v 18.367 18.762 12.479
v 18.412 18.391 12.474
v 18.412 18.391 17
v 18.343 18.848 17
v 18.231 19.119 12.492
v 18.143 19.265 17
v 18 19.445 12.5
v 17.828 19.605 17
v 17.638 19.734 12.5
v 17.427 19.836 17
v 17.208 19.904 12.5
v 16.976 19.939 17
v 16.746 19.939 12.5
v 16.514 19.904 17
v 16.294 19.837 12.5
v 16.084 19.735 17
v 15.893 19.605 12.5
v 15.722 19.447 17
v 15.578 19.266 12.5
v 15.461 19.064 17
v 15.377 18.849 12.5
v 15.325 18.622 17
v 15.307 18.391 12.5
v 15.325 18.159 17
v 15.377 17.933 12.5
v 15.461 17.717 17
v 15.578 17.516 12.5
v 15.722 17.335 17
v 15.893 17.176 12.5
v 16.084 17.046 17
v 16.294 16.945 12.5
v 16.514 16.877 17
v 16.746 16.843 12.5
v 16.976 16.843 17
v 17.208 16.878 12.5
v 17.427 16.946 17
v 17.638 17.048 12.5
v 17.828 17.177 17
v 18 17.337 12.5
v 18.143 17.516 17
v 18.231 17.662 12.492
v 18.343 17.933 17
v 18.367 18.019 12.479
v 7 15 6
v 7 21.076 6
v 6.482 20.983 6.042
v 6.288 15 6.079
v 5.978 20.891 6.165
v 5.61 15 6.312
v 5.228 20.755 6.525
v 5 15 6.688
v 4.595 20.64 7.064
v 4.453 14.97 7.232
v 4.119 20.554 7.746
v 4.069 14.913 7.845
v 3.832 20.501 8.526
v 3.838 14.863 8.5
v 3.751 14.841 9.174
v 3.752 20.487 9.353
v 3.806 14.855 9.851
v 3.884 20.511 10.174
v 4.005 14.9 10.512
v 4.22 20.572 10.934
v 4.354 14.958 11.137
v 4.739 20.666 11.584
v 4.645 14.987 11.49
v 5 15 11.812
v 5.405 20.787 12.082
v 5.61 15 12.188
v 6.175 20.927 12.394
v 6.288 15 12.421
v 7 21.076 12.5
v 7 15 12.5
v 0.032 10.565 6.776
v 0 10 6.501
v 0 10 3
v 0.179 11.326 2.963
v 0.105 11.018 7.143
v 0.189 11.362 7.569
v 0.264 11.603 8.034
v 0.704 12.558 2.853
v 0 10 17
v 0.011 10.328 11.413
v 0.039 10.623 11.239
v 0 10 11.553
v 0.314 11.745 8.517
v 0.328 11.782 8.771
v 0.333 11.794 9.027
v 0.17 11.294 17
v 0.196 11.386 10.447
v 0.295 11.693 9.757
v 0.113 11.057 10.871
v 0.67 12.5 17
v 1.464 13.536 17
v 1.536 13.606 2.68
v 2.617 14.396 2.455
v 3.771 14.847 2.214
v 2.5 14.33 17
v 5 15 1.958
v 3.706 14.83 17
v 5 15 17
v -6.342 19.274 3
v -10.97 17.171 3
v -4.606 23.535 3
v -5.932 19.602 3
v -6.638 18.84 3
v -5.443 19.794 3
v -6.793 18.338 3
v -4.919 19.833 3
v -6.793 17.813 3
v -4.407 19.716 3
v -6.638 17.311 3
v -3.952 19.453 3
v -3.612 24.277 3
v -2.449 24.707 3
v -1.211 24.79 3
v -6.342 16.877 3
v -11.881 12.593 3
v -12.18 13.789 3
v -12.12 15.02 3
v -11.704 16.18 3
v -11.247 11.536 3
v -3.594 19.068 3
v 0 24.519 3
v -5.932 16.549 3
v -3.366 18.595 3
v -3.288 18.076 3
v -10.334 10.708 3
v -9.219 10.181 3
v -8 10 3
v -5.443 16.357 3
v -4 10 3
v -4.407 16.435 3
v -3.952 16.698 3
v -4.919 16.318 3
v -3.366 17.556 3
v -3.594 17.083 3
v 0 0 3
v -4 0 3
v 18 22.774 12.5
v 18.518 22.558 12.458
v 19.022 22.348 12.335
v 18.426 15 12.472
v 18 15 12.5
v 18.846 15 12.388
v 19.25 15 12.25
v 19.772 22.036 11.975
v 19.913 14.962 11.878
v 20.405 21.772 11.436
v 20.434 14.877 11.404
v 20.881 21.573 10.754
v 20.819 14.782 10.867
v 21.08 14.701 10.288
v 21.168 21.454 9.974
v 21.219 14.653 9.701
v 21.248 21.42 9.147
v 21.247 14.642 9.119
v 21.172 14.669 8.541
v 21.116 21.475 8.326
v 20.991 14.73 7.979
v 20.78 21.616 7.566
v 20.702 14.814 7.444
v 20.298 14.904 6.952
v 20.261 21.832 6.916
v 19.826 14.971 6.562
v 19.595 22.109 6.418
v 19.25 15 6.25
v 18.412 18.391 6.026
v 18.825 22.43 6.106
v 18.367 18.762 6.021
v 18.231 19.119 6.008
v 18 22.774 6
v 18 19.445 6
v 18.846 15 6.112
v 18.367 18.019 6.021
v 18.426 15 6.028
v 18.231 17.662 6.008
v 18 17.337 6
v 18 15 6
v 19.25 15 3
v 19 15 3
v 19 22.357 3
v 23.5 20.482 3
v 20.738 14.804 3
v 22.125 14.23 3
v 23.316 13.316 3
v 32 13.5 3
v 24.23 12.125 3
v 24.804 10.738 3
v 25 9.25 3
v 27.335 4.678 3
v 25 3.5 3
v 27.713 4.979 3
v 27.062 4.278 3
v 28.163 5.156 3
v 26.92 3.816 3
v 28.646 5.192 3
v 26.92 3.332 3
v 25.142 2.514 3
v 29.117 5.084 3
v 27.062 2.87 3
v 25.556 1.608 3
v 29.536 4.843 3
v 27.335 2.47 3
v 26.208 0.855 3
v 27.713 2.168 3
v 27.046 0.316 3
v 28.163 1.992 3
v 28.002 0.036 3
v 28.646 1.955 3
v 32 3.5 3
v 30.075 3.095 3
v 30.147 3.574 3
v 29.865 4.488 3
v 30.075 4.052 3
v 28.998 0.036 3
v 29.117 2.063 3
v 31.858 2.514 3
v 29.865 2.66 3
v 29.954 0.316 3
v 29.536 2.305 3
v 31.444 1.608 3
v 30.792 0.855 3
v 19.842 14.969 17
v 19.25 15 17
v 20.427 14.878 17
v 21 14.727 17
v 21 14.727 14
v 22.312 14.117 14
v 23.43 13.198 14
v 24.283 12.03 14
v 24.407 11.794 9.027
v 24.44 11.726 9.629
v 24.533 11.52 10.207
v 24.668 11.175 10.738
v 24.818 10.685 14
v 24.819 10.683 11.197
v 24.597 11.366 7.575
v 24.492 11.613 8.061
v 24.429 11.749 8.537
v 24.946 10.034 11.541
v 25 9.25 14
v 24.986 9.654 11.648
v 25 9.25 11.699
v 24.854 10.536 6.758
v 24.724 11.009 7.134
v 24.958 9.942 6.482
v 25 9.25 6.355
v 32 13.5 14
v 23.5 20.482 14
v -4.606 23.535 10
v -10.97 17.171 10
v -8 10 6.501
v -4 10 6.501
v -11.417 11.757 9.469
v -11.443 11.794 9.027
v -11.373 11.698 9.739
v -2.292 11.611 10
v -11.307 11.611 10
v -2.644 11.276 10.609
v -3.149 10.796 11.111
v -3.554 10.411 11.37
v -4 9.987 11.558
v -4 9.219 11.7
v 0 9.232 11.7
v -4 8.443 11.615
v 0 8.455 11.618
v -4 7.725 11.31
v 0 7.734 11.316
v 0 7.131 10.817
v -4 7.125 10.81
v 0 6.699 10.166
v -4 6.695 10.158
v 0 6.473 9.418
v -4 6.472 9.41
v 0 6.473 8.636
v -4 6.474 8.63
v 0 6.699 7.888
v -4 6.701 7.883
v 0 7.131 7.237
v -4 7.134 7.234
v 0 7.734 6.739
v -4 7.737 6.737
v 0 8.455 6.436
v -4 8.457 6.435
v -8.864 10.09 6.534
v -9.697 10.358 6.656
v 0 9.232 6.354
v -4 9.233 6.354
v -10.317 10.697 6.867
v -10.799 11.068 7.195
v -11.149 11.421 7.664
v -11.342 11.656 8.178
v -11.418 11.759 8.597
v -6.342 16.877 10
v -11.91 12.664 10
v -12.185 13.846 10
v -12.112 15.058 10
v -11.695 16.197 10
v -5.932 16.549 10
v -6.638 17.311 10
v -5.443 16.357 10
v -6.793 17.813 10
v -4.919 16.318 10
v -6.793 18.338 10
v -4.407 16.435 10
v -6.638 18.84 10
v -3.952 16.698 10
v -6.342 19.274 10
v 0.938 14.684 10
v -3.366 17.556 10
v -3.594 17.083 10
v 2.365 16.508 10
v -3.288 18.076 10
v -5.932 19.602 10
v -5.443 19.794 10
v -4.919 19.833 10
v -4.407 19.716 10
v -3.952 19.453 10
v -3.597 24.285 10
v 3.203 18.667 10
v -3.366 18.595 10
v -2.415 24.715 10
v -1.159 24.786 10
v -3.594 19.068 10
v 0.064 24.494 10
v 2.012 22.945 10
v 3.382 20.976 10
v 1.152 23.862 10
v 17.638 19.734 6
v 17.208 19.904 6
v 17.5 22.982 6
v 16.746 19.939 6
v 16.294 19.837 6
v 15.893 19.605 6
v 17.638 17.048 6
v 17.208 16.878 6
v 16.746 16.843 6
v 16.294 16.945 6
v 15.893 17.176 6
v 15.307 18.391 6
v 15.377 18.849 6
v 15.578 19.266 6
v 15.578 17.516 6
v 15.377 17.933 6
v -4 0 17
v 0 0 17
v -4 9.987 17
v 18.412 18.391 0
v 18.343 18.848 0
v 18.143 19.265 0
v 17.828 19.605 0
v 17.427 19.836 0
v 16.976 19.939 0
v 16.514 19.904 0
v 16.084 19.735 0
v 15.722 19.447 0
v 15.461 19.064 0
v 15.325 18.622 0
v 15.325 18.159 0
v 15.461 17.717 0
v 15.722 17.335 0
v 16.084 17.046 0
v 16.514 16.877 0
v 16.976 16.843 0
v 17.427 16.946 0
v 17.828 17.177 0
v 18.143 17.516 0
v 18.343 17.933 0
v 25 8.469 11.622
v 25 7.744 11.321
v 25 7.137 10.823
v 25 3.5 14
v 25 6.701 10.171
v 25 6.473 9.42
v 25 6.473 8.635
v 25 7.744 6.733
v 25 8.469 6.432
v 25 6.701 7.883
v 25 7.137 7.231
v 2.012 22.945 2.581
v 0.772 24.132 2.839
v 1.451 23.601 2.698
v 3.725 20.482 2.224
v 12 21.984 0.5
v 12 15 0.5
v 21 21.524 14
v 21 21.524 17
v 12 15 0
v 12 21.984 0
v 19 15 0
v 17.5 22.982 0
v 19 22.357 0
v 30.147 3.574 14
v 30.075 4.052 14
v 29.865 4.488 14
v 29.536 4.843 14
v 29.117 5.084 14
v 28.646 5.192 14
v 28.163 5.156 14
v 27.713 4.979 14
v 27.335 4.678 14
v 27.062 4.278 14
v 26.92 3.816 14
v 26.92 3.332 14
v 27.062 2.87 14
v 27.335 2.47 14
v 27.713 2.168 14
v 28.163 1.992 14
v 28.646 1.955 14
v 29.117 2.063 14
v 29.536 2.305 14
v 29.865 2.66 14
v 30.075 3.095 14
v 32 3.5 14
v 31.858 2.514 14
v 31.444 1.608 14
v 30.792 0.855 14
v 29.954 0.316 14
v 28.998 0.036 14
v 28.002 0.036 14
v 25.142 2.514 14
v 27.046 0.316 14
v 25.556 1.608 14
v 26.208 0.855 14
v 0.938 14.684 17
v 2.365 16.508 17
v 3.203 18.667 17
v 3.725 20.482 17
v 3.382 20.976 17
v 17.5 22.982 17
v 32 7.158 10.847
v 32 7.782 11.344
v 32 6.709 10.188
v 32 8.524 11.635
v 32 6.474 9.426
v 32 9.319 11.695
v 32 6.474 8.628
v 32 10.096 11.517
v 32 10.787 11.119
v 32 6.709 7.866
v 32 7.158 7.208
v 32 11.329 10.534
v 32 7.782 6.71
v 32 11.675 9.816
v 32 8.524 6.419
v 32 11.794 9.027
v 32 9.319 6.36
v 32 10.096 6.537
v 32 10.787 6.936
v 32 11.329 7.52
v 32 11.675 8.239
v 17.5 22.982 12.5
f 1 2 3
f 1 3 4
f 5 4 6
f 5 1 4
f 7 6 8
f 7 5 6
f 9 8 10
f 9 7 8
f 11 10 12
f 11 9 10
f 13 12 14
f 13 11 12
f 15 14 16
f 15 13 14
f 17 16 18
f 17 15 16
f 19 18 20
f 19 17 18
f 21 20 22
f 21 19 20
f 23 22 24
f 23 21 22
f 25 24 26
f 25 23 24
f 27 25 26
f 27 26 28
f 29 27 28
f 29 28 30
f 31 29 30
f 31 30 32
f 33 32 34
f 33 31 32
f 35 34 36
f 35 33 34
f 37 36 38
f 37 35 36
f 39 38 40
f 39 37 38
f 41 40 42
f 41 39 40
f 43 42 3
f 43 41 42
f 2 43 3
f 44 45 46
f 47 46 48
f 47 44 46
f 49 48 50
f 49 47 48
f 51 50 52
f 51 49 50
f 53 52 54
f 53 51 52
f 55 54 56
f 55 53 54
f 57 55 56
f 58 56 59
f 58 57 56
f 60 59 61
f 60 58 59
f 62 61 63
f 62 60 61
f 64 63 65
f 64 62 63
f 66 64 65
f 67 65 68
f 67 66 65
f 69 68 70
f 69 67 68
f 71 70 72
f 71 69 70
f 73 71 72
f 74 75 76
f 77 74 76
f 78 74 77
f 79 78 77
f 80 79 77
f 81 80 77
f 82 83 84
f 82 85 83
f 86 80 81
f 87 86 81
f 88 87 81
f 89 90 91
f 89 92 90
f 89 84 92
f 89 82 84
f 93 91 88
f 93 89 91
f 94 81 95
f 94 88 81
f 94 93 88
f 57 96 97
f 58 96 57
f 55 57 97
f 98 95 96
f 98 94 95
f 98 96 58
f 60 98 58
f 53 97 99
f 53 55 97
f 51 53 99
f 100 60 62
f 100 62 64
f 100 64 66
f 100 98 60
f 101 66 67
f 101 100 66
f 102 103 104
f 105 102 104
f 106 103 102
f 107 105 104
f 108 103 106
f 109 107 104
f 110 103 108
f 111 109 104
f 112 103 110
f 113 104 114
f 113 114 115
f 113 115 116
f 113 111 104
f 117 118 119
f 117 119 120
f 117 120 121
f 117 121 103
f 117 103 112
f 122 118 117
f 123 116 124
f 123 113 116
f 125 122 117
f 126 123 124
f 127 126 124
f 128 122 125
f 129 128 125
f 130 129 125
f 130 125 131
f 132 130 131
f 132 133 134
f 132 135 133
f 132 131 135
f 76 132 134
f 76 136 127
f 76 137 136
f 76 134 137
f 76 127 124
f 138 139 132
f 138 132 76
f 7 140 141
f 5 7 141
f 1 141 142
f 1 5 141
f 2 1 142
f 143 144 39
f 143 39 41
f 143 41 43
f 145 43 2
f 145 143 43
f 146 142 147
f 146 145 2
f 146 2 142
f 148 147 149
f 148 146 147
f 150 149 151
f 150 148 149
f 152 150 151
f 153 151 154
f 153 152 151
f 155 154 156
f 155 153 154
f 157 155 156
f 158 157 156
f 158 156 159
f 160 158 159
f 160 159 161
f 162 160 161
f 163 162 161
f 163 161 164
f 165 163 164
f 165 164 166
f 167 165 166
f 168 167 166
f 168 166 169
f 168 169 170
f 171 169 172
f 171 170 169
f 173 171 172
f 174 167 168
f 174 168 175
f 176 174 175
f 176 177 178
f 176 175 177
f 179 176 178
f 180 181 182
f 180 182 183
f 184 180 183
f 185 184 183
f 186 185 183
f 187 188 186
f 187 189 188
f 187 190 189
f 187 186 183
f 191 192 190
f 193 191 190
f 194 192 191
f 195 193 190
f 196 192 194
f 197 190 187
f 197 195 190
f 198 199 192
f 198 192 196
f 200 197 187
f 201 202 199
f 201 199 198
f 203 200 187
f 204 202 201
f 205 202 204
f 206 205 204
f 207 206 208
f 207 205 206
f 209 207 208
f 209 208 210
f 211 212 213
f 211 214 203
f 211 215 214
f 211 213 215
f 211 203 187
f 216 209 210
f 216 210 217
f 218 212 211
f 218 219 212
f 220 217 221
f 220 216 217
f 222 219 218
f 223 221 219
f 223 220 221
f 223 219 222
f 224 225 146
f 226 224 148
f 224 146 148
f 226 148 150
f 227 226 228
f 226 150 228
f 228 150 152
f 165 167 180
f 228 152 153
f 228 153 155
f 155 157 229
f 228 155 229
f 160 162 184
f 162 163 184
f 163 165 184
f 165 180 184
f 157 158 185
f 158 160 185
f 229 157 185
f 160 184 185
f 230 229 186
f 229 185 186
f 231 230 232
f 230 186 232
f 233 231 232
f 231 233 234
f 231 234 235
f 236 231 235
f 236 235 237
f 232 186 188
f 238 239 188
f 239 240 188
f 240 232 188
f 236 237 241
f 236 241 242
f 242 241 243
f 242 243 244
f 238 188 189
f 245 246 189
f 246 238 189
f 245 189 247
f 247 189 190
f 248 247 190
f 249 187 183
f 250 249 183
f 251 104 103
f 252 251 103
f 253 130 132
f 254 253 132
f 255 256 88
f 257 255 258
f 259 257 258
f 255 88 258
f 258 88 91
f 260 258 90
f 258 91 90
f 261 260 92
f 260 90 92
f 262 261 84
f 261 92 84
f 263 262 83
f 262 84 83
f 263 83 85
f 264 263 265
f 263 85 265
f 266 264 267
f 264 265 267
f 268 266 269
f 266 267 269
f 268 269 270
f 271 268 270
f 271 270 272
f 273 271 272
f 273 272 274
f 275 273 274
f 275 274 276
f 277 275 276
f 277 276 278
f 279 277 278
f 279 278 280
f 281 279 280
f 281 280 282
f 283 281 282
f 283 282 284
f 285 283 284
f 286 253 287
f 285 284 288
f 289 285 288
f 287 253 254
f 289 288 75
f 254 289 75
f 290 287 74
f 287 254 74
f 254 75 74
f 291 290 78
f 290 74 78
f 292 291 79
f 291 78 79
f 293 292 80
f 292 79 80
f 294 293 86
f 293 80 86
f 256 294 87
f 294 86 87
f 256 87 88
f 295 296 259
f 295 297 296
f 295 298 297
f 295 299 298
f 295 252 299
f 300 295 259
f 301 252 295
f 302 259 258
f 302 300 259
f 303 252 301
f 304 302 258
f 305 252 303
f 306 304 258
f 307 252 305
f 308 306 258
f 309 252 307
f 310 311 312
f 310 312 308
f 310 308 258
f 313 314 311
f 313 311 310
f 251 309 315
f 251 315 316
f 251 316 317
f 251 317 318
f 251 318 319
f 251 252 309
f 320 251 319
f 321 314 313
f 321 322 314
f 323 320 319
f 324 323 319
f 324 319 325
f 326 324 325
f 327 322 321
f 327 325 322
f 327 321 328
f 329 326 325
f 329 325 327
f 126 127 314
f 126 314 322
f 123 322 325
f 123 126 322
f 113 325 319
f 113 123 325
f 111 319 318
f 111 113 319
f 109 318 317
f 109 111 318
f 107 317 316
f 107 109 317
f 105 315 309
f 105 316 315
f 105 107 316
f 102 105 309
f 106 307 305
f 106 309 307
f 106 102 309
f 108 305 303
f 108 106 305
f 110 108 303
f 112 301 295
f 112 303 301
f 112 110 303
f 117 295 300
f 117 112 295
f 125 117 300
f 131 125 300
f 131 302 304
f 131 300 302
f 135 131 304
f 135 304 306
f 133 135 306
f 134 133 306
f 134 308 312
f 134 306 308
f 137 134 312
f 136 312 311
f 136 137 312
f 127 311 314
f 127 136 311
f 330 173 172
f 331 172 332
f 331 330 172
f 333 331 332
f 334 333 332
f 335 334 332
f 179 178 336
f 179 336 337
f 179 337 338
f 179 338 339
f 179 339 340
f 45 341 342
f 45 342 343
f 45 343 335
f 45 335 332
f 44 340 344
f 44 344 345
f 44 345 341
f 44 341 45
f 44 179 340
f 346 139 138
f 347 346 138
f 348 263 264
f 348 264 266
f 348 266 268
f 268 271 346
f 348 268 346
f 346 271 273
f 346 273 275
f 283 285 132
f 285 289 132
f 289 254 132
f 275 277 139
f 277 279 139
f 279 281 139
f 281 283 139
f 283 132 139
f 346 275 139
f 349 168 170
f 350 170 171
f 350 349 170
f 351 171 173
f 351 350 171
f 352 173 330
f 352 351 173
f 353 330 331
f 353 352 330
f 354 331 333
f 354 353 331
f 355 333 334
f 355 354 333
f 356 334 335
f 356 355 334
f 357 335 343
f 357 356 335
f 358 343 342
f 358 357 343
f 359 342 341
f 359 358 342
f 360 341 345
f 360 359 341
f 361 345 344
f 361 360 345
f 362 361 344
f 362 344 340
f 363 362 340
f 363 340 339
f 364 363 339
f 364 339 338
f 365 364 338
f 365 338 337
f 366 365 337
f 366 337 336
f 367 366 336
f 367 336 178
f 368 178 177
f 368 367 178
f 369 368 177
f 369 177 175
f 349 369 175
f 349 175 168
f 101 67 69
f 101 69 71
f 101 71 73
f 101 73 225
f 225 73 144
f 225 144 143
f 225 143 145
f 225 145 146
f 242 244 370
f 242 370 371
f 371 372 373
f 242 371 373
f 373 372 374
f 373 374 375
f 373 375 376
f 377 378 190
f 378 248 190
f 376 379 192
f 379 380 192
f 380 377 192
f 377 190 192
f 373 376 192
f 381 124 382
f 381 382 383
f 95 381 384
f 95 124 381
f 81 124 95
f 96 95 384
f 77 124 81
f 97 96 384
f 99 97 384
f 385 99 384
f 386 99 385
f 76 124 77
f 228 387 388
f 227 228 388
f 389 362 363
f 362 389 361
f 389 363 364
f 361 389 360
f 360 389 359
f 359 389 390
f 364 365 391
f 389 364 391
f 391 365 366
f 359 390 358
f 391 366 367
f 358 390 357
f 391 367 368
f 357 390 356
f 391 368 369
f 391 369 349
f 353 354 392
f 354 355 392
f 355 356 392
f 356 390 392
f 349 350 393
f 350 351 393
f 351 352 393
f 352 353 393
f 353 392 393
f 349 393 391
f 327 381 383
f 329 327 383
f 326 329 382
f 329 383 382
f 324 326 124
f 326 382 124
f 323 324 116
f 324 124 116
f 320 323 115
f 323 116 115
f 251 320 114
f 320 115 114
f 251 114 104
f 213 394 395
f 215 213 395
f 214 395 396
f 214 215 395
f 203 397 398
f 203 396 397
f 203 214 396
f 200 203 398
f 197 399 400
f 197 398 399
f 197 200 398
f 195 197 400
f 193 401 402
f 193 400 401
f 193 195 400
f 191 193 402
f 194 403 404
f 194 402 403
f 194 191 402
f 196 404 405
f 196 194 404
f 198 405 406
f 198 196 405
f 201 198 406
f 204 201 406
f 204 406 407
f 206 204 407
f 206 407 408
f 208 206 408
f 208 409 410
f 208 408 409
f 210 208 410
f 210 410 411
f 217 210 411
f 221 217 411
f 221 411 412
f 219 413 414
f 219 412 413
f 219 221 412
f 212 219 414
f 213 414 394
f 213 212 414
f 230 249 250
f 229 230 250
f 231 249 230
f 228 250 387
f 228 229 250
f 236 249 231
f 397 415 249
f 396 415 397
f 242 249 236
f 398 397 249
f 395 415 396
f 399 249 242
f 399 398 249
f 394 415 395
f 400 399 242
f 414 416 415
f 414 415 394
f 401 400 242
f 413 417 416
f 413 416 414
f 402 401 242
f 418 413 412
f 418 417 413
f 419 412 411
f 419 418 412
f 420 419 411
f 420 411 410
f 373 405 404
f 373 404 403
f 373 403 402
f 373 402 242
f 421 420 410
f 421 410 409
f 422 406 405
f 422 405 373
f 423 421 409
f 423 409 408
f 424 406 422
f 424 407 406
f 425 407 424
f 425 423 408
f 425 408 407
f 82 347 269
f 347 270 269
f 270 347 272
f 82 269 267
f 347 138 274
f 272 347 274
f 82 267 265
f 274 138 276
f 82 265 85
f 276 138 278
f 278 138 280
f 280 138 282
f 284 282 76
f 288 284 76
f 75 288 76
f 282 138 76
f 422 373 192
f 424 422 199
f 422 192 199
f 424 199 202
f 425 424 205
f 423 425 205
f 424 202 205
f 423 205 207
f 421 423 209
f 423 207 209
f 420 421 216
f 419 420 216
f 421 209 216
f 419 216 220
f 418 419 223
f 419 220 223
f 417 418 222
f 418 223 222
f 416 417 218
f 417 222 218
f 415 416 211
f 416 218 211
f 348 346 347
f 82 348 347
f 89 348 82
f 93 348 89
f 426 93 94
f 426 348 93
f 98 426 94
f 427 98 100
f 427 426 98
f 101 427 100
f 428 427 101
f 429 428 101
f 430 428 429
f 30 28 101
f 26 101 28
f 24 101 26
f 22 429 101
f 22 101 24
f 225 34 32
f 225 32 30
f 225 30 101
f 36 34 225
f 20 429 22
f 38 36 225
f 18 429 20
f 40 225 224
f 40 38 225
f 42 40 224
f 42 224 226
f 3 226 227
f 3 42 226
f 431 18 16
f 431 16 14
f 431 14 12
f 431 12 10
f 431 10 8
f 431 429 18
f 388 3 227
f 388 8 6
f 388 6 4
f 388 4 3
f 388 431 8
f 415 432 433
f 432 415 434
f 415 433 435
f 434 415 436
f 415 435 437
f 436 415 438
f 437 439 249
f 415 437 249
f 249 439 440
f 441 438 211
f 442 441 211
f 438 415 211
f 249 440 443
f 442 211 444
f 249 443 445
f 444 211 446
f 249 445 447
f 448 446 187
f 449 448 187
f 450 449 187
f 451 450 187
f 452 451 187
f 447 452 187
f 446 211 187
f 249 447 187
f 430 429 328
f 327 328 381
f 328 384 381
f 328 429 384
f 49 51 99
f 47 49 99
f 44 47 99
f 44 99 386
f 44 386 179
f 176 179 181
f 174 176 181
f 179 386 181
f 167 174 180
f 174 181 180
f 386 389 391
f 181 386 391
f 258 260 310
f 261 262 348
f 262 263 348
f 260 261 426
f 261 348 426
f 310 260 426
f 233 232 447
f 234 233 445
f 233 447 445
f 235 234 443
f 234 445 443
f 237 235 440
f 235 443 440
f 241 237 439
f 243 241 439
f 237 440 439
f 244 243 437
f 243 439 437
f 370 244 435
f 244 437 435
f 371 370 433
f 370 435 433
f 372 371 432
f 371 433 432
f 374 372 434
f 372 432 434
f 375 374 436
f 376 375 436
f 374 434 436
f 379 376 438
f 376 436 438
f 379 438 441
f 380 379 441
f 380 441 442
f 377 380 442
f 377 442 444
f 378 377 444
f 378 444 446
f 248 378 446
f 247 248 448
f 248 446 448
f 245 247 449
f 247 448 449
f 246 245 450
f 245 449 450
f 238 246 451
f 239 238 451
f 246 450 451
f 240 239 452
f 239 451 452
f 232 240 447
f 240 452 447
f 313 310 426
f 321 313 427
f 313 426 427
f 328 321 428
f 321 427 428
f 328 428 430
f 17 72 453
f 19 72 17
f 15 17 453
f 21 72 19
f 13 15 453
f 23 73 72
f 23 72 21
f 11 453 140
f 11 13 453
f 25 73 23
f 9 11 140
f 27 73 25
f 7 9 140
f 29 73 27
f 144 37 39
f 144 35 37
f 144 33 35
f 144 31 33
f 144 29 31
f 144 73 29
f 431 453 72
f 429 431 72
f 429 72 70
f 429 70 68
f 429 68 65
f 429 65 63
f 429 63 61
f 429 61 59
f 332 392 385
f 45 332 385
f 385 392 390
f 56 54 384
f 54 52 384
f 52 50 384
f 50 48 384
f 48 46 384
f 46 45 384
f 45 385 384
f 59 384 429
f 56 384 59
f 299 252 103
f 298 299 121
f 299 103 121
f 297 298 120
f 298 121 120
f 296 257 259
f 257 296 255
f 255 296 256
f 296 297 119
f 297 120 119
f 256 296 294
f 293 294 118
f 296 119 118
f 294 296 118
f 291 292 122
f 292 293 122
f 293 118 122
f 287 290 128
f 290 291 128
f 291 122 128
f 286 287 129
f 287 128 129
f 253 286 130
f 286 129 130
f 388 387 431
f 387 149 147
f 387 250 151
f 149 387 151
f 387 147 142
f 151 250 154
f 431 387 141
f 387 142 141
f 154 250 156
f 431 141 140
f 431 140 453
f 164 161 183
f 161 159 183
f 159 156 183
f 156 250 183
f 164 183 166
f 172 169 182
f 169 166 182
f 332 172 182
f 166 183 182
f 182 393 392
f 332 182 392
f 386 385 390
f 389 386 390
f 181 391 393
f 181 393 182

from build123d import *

# Parameters (mm, degrees)
F1_DEPTH  = 17
F2_R      = 5
F4_DEPTH  = 25
F7_DEPTH  = 7
F8_R      = 1.6228798791
F8_R_2    = 1.552456108
F8_R_3    = 1.7623350299
F10_DEPTH = 25
F9_R      = 2.6750370967
F11_DEPTH = 37.3


with BuildPart() as f1:
    # F0 (on Top) → F1 (new body)
    with BuildSketch(Plane.XY):
        with BuildLine():
            Line((-4, 0), (0, 0))
            Line((0, 0), (0, 15))
            Line((0, 15), (19.25, 15))
            ThreePointArc((19.25, 15), (23.3158639918, 13.3158639918), (25, 9.25))
            Line((25, 9.25), (25, 3.5))
            ThreePointArc((25, 3.5), (28.5, 0), (32, 3.5))
            Line((32, 3.5), (32, 13.5))
            Line((32, 13.5), (23.5, 20.4821200219))
            Line((23.5, 20.4821200219), (17.5, 22.9821200219))
            Line((17.5, 22.9821200219), (3.725022686, 20.4821200219))
            Line((3.725022686, 20.4821200219), (2.0120524503, 22.9449909018))
            ThreePointArc((2.0120524503, 22.9449909018), (-1.159330371, 24.7860054935), (-4.6061857342, 23.5345296327))
            Line((-4.6061857342, 23.5345296327), (-10.9701467649, 17.170568602))
            ThreePointArc((-10.9701467649, 17.170568602), (-11.8806837632, 12.5929899911), (-8, 10))
            Line((-8, 10), (-4, 10))
            Line((-4, 10), (-4, 0))
        make_face()
    extrude(amount=F1_DEPTH)

    # F2
    f2_edges = [f1.edges().sort_by_distance(p)[0] for p in [
        (0, 15, 8.5),
    ]]
    fillet(f2_edges, radius=F2_R)

    # F3 (on Front) → F4 (intersect)
    with BuildSketch(Plane.XZ):
        Polygon((12, 0), (19, 0), (19, 3), (32, 3), (32, 14), (21, 14), (21, 17), (-13, 17), (-13, 3), (0, 3), (12, 0.5), align=None)
        with BuildLine():
            Line((18, 6), (7, 6))
            ThreePointArc((7, 6), (3.75, 9.25), (7, 12.5))
            Line((7, 12.5), (18, 12.5))
            ThreePointArc((18, 12.5), (21.25, 9.25), (18, 6))
        make_face(mode=Mode.SUBTRACT)
    extrude(amount=-F4_DEPTH, mode=Mode.INTERSECT)

    # F6 (on offset) → F7 (cut)
    with BuildSketch(Plane.XY.offset(17)):
        with BuildLine():
            Line((3.1616305932, 22.3574396223), (2.5333629455, 31.5121971071))
            Line((2.5333629455, 31.5121971071), (-19.064229839, 31.5121971071))
            Line((-19.064229839, 31.5121971071), (-10.1016564295, 4.1825510561))
            Line((-10.1016564295, 4.1825510561), (0.9379045805, 14.6835977212))
            ThreePointArc((0.9379045805, 14.6835977212), (3.08761934, 18.2197699763), (3.1616305932, 22.3574396223))
        make_face()
    extrude(amount=-F7_DEPTH, mode=Mode.SUBTRACT)

    # F8 (on Top) → F10 (cut)
    with BuildSketch(Plane.XY):
        with Locations((28.5243559629, 3.5737901926)):
            Circle(F8_R)
        with Locations((16.8598778546, 18.3908306062)):
            Circle(F8_R_2)
        with Locations((-5.050426349, 18.0755741894)):
            Circle(F8_R_3)
    extrude(amount=F10_DEPTH, mode=Mode.SUBTRACT)

    # F9 (on Right) → F11 (cut, symmetric)
    with BuildSketch(Plane.YZ):
        with Locations((9.1190673411, 9.0270899236)):
            Circle(F9_R)
    extrude(amount=F11_DEPTH, both=True, mode=Mode.SUBTRACT)


solid = f1.part
